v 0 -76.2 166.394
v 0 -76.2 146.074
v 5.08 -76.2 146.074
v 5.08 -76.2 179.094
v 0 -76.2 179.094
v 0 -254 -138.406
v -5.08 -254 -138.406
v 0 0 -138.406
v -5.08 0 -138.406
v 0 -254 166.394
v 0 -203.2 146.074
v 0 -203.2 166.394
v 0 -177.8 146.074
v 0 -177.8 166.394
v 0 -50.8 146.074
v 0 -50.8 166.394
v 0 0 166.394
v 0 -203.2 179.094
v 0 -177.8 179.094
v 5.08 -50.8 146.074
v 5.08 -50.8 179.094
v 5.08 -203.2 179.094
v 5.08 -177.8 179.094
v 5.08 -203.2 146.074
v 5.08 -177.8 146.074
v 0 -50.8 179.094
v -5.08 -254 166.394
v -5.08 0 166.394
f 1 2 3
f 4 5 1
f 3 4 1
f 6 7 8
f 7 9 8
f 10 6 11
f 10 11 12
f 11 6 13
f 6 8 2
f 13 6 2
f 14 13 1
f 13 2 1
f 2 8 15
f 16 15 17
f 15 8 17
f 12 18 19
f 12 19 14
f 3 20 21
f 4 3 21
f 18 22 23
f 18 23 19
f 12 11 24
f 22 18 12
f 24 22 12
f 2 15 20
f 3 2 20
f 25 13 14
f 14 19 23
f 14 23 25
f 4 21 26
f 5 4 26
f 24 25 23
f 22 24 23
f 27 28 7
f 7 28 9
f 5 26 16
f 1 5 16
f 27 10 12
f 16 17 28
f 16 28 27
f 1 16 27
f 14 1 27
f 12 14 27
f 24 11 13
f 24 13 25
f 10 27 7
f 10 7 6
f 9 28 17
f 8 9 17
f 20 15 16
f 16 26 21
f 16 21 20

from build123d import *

# Parameters (mm, degrees)
F0_W     = 5.08
F0_H     = 304.8
F1_DEPTH = 50.8
F3_DEPTH = 25.4
F5_DEPTH = 101.6
F7_DEPTH = 25.4
F9_DEPTH = 50.8


with BuildPart() as f1:
    # F0 (on Front) → F1 (new body)
    with BuildSketch(Plane.XZ):
        with Locations((-2.54, 13.9935184479)):
            Rectangle(F0_W, F0_H)
    extrude(amount=F1_DEPTH)

    # F2 (on face) → F3 (join)
    with BuildSketch(Plane.XZ.offset(50.8)):
        Polygon((0, 179.0935184479), (0, 166.3935184479), (0, 146.0735184479), (5.08, 146.0735184479), (5.08, 179.0935184479), align=None)
        Polygon((0, 146.0735184479), (0, 166.3935184479), (-5.08, 166.3935184479), (-5.08, -138.4064815521), (0, -138.4064815521), align=None)
    extrude(amount=F3_DEPTH)

    # F4 (on face) → F5 (join)
    with BuildSketch(Plane.XZ.offset(76.2)):
        Polygon((0, 166.3935184479), (-5.08, 166.3935184479), (-5.08, -138.4064815521), (0, -138.4064815521), (0, 146.0735184479), align=None)
    extrude(amount=F5_DEPTH)

    # F6 (on face) → F7 (join)
    with BuildSketch(Plane.XZ.offset(177.8)):
        Polygon((0, 179.0935184479), (0, 166.3935184479), (0, 146.0735184479), (5.08, 146.0735184479), (5.08, 179.0935184479), align=None)
        Polygon((0, 146.0735184479), (0, 166.3935184479), (-5.08, 166.3935184479), (-5.08, -138.4064815521), (0, -138.4064815521), align=None)
    extrude(amount=F7_DEPTH)

    # F8 (on face) → F9 (join)
    with BuildSketch(Plane.XZ.offset(203.2)):
        Polygon((0, 166.3935184479), (-5.08, 166.3935184479), (-5.08, -138.4064815521), (0, -138.4064815521), (0, 146.0735184479), align=None)
    extrude(amount=F9_DEPTH)


solid = f1.part
